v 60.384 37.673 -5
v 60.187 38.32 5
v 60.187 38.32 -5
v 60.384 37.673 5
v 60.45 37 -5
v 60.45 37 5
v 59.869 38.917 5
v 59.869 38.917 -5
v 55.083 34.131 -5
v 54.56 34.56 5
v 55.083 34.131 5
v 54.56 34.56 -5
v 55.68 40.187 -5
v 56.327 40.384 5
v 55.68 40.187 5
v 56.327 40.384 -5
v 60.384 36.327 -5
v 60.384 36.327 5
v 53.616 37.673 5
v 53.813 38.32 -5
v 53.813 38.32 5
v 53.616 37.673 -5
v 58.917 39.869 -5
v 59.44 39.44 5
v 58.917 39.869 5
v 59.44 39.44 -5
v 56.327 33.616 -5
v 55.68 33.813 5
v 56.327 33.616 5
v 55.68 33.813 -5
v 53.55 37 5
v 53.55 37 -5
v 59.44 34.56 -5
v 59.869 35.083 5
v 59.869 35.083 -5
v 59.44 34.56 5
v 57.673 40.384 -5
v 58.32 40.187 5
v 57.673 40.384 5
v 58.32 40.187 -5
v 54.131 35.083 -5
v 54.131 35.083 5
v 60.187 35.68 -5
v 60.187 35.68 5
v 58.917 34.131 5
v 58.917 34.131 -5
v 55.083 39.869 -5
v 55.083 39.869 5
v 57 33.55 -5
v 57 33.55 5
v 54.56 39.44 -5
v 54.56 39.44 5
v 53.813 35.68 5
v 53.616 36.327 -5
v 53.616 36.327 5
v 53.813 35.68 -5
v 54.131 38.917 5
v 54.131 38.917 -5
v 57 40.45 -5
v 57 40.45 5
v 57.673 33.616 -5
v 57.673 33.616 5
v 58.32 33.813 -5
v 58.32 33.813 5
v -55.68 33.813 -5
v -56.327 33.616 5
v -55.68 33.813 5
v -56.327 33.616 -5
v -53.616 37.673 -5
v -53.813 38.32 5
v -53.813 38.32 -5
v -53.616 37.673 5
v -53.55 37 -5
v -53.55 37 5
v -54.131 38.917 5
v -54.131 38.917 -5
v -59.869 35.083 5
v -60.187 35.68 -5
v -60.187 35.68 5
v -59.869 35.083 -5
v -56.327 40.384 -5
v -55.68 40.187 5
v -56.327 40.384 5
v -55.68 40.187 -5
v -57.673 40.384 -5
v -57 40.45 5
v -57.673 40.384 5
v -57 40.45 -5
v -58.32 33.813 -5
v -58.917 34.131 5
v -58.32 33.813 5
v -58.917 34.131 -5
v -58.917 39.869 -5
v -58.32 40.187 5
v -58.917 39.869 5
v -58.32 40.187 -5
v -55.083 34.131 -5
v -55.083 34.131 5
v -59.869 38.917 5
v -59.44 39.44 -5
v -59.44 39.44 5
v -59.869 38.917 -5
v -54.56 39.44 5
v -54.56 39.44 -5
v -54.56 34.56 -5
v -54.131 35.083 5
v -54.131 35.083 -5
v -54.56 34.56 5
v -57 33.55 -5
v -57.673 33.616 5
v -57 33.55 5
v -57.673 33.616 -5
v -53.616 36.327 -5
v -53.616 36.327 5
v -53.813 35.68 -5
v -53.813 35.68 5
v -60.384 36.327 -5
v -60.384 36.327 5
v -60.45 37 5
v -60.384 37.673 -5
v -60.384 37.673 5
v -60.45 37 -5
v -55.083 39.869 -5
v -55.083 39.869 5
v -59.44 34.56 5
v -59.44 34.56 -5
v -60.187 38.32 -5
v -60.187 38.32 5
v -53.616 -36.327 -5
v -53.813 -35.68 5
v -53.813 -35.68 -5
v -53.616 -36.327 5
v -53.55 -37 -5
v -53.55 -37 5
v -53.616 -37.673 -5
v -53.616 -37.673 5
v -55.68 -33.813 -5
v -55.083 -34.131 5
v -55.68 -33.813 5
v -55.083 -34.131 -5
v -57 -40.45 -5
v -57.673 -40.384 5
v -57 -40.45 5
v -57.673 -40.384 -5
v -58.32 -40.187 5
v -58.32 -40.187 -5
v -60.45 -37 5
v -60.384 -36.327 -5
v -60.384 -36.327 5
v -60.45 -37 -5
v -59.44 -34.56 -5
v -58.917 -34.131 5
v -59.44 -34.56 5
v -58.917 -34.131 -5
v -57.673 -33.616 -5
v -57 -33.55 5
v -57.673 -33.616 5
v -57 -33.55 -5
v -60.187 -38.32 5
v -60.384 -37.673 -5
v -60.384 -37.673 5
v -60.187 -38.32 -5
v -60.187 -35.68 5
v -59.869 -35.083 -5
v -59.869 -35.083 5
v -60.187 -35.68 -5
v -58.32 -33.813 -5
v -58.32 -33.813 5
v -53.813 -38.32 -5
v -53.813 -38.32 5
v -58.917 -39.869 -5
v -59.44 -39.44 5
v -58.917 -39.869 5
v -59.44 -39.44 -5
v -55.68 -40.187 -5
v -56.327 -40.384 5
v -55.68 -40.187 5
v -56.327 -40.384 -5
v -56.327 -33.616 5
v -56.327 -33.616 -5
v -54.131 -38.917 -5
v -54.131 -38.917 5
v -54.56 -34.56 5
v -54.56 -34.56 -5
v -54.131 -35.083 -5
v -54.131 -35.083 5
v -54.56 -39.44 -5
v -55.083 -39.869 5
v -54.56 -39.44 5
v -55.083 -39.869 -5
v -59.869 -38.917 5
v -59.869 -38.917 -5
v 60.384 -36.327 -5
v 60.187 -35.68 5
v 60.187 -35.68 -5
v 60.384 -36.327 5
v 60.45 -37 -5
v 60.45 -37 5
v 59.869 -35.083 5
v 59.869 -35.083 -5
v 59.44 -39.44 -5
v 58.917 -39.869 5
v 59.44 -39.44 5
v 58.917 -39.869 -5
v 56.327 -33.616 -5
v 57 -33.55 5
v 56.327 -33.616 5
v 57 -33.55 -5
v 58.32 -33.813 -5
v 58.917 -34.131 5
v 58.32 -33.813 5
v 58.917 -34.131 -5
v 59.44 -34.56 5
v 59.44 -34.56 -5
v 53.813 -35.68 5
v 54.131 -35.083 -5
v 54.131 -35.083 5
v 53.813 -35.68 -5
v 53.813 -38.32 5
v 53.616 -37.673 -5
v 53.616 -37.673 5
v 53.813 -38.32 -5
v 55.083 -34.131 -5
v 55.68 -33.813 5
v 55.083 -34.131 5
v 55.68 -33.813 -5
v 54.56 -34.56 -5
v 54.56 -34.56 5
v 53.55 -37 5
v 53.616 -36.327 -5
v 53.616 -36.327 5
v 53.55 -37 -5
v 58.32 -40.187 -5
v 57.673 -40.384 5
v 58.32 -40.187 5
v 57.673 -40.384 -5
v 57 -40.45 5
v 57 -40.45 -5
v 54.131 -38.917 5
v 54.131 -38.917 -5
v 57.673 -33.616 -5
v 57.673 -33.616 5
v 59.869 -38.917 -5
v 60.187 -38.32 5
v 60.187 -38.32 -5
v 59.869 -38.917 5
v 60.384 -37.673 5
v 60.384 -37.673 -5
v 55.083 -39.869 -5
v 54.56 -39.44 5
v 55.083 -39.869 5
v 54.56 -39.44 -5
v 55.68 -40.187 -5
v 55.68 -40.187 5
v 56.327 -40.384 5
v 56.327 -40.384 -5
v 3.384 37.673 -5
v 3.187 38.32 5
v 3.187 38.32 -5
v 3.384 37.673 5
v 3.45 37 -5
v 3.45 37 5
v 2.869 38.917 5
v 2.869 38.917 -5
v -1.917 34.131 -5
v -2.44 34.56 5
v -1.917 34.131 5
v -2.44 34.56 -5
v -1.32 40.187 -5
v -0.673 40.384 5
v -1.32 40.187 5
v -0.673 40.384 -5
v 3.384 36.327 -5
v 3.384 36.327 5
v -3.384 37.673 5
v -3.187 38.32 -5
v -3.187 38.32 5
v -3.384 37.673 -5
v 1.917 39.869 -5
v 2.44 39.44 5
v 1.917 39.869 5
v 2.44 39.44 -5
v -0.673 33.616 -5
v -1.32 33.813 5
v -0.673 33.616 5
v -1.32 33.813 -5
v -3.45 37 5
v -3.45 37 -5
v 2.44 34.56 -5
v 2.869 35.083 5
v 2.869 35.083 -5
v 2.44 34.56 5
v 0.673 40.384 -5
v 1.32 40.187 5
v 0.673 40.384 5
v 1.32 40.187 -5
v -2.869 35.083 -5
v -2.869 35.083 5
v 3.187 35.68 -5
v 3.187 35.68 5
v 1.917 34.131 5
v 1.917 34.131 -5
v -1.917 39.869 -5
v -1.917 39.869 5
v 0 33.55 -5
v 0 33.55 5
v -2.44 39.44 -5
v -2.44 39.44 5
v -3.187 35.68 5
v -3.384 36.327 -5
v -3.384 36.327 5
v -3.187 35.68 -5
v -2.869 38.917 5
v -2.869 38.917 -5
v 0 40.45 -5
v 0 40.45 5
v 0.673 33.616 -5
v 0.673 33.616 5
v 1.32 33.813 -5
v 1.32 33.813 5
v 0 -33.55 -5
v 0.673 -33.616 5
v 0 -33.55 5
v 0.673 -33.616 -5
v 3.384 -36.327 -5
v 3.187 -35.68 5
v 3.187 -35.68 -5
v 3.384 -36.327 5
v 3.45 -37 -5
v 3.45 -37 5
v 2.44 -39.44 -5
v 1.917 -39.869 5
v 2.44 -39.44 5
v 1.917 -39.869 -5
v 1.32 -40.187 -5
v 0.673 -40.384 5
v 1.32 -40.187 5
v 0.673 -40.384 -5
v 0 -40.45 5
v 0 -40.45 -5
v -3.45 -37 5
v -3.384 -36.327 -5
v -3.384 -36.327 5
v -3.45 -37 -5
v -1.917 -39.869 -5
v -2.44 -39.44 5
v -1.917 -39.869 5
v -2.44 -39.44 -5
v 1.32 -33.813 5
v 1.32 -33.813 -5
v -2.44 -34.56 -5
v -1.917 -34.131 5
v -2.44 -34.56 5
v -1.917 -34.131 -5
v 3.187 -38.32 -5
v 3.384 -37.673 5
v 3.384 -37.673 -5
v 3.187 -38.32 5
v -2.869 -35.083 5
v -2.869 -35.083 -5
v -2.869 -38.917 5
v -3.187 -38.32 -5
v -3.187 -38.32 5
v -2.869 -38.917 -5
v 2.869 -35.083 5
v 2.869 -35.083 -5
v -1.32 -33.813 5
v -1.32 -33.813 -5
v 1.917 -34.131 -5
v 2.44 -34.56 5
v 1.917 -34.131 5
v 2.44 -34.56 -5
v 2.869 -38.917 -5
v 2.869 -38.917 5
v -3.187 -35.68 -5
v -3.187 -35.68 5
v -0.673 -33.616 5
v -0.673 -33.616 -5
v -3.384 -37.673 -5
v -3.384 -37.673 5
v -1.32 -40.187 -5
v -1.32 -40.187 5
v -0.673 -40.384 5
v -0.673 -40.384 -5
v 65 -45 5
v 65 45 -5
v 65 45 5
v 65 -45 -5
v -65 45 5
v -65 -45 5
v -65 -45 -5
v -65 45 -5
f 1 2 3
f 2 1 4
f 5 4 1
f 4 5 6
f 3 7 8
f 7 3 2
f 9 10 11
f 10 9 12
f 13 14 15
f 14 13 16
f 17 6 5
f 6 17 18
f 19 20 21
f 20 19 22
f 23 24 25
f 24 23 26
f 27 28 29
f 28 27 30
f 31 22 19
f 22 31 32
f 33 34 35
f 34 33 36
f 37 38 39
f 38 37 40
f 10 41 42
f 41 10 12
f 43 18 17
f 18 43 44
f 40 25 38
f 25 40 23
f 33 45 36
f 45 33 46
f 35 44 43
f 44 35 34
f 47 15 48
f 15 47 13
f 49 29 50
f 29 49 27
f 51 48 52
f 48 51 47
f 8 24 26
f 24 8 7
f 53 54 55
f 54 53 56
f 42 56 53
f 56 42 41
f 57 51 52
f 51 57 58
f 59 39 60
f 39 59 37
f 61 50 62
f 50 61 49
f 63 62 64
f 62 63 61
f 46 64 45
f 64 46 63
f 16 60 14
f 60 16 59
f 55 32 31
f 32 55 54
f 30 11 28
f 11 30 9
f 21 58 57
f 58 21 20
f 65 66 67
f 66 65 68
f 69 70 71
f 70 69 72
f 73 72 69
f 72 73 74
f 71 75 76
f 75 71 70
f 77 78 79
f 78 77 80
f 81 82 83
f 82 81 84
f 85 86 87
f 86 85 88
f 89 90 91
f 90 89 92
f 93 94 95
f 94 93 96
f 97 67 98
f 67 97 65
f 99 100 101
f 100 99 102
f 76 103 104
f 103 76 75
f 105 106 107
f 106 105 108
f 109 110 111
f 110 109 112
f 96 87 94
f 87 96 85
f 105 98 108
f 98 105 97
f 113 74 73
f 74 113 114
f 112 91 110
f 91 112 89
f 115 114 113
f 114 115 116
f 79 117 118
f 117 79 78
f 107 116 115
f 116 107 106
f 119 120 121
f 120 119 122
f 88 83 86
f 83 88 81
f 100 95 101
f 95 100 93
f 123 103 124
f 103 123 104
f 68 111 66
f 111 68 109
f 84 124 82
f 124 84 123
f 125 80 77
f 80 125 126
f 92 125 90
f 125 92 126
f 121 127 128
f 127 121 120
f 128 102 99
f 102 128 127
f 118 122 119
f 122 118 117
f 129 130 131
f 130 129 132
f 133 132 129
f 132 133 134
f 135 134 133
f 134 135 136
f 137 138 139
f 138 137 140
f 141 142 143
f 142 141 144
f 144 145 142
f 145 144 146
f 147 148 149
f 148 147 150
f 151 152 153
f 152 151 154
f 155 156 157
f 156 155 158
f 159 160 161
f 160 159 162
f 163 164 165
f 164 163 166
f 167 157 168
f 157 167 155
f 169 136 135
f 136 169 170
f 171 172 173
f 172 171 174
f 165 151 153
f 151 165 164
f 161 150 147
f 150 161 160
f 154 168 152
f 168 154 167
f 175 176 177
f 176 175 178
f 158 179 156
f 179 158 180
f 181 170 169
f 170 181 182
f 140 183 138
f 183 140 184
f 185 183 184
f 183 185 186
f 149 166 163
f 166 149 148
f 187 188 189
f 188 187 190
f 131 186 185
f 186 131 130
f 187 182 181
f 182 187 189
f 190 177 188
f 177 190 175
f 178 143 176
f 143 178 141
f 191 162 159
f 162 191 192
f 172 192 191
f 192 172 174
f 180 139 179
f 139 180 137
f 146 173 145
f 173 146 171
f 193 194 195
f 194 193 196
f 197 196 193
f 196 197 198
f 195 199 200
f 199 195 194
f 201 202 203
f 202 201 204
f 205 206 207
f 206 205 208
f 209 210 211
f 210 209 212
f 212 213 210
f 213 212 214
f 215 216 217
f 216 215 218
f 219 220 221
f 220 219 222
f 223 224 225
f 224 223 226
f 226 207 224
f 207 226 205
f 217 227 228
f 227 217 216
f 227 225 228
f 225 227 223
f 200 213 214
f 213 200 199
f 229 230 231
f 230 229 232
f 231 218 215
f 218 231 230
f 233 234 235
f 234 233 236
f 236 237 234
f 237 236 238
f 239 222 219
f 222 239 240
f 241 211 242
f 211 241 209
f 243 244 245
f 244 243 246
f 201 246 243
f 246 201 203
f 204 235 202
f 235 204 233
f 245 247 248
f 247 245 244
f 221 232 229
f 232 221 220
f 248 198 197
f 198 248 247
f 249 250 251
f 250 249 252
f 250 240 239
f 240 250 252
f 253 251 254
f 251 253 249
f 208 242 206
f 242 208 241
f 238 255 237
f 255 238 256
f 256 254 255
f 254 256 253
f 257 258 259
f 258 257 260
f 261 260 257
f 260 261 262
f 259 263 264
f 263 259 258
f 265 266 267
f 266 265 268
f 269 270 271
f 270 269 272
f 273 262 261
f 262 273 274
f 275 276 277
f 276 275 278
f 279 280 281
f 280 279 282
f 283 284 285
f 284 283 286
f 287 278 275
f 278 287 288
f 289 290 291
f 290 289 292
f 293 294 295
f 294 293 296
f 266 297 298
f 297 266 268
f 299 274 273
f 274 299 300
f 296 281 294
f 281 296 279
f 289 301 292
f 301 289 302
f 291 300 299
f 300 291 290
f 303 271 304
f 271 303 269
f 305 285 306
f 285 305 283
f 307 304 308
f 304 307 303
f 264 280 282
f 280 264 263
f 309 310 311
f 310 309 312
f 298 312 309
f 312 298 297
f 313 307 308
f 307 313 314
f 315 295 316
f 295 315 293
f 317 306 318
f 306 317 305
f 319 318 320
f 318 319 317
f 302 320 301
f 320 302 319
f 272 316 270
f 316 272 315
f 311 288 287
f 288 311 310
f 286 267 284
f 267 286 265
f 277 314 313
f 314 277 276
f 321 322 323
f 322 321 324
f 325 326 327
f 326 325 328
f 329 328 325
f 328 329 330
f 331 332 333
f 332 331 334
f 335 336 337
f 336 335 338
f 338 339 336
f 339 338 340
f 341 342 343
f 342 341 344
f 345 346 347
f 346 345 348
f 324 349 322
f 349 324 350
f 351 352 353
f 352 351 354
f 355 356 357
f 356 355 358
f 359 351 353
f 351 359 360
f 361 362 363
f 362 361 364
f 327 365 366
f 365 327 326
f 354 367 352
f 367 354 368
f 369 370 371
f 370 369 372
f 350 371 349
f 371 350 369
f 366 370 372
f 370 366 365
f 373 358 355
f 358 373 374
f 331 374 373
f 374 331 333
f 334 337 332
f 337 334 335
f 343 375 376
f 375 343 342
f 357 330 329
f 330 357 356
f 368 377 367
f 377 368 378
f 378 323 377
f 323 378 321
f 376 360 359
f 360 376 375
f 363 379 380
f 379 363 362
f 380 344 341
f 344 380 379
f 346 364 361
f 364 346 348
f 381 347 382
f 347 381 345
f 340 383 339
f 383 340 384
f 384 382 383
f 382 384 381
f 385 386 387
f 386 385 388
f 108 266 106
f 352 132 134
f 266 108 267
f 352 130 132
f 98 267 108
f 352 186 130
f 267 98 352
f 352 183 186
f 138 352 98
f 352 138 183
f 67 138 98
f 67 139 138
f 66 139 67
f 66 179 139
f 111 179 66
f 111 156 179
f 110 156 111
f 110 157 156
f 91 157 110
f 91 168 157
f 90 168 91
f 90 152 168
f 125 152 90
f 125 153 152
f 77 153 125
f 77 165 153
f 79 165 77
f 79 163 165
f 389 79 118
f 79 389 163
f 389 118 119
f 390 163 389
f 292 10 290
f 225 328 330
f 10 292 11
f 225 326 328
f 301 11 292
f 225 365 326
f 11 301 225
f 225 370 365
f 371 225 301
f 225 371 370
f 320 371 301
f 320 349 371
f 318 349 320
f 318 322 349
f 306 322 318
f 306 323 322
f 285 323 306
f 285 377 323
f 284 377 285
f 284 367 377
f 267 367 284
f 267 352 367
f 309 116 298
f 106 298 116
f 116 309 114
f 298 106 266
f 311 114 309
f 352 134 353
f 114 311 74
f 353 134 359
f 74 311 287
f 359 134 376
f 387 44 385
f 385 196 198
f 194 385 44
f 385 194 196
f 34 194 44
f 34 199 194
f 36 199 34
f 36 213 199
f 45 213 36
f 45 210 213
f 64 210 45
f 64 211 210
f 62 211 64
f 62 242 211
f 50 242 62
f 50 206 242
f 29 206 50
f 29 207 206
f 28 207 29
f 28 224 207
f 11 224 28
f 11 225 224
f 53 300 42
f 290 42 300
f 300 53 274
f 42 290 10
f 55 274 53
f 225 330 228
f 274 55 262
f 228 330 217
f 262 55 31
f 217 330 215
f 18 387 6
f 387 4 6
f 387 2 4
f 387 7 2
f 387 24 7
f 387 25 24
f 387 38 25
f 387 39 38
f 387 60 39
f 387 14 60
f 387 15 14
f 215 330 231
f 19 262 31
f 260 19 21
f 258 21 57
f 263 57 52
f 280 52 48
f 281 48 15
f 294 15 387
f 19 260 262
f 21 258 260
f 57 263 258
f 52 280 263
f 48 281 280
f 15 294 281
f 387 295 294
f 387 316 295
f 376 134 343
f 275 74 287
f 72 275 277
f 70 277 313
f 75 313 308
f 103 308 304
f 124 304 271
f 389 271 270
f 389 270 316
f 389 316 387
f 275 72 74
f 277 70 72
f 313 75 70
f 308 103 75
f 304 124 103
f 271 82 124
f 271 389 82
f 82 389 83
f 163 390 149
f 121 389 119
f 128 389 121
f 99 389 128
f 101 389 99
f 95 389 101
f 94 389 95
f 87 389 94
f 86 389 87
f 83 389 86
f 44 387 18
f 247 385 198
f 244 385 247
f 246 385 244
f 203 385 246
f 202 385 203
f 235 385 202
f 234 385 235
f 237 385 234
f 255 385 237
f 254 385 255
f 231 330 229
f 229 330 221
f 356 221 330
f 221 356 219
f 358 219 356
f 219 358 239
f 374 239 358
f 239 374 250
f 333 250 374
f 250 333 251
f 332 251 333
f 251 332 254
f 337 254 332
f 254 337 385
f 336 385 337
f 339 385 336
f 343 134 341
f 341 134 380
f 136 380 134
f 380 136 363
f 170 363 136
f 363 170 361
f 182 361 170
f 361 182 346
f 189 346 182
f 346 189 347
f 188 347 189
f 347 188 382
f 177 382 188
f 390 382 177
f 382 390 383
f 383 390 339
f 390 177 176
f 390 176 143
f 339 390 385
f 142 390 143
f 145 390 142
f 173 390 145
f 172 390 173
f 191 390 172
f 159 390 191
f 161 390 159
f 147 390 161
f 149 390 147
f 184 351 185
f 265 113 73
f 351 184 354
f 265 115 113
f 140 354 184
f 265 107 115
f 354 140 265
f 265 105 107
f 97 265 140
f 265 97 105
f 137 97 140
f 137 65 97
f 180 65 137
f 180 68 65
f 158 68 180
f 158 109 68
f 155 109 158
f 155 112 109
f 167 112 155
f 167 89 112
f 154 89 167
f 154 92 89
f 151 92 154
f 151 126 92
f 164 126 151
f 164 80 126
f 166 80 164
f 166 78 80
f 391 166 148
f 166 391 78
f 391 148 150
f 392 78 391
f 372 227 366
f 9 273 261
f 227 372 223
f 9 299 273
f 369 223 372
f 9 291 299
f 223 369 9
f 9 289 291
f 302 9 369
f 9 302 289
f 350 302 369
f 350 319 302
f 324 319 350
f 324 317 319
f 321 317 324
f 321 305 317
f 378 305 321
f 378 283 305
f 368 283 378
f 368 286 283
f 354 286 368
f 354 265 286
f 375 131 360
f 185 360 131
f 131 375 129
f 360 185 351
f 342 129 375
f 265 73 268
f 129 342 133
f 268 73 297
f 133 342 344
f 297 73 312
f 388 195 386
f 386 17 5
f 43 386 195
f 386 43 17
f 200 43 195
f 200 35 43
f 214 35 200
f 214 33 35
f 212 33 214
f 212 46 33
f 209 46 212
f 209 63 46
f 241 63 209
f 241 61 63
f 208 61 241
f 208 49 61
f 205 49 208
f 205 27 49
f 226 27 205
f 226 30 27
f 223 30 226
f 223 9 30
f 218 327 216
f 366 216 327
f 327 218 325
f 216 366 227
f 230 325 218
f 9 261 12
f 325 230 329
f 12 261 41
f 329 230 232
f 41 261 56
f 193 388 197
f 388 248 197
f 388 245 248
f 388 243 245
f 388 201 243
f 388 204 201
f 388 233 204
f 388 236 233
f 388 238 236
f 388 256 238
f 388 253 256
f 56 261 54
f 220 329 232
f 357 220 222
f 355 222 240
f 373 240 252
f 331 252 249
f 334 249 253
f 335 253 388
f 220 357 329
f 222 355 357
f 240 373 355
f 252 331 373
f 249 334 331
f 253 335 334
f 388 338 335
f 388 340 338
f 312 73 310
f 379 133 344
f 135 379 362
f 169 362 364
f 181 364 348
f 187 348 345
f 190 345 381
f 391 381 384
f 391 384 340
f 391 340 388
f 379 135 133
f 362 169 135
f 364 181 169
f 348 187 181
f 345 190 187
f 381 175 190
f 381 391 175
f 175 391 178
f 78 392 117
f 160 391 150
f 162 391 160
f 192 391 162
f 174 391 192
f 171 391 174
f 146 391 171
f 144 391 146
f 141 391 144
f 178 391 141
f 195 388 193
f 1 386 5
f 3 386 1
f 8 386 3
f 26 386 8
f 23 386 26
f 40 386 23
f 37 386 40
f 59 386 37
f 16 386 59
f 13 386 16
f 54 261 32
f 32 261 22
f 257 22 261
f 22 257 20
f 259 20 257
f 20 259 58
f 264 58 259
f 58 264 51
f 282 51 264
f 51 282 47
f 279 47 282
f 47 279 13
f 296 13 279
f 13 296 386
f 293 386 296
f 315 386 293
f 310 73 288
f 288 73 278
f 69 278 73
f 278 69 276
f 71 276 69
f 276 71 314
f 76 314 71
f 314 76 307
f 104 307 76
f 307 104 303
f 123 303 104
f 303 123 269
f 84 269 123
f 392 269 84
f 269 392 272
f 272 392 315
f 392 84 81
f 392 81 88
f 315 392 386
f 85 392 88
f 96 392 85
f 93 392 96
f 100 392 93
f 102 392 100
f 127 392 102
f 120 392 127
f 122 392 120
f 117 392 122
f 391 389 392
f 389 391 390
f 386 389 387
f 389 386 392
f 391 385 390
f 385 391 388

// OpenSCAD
$fn = 32;

// ----------------------------------------------------------------------
// Corner plate 130 x 90 x 10
// 6 holes, centres taken from the edge offset
// ----------------------------------------------------------------------

// --- parameters (mm) ---
plate = [130, 90, 10];  // overall size (x, y, z)
holes = 6;              // number of holes the drawing asks for
bore_d = 6.6;           // nominal hole diameter from the drawing
print_allowance = 0.3;  // clearance added for printing
edge = 8;               // hole centre offset from the plate edge

// --- derived feature positions (mm) ---
hole_d = bore_d + print_allowance;  // = 6.9   hole diameter as printed
corner_x = plate[0] / 2 - edge;     // = 57   corner hole X
corner_y = plate[1] / 2 - edge;     // = 37   corner hole Y
feature_centers = [
  [corner_x, corner_y],
  [-corner_x, corner_y],
  [-corner_x, -corner_y],
  [corner_x, -corner_y],
  [0, corner_y],
  [0, -corner_y]
];   // hole centres the loop below drills

// plate outline, every hole drilled through with the same cutters
difference() {
  cube(plate, center = true);
  for (centre = feature_centers)
    translate([centre[0], centre[1], 0])
      cylinder(d = hole_d, h = plate[2] + 2, center = true);
}
